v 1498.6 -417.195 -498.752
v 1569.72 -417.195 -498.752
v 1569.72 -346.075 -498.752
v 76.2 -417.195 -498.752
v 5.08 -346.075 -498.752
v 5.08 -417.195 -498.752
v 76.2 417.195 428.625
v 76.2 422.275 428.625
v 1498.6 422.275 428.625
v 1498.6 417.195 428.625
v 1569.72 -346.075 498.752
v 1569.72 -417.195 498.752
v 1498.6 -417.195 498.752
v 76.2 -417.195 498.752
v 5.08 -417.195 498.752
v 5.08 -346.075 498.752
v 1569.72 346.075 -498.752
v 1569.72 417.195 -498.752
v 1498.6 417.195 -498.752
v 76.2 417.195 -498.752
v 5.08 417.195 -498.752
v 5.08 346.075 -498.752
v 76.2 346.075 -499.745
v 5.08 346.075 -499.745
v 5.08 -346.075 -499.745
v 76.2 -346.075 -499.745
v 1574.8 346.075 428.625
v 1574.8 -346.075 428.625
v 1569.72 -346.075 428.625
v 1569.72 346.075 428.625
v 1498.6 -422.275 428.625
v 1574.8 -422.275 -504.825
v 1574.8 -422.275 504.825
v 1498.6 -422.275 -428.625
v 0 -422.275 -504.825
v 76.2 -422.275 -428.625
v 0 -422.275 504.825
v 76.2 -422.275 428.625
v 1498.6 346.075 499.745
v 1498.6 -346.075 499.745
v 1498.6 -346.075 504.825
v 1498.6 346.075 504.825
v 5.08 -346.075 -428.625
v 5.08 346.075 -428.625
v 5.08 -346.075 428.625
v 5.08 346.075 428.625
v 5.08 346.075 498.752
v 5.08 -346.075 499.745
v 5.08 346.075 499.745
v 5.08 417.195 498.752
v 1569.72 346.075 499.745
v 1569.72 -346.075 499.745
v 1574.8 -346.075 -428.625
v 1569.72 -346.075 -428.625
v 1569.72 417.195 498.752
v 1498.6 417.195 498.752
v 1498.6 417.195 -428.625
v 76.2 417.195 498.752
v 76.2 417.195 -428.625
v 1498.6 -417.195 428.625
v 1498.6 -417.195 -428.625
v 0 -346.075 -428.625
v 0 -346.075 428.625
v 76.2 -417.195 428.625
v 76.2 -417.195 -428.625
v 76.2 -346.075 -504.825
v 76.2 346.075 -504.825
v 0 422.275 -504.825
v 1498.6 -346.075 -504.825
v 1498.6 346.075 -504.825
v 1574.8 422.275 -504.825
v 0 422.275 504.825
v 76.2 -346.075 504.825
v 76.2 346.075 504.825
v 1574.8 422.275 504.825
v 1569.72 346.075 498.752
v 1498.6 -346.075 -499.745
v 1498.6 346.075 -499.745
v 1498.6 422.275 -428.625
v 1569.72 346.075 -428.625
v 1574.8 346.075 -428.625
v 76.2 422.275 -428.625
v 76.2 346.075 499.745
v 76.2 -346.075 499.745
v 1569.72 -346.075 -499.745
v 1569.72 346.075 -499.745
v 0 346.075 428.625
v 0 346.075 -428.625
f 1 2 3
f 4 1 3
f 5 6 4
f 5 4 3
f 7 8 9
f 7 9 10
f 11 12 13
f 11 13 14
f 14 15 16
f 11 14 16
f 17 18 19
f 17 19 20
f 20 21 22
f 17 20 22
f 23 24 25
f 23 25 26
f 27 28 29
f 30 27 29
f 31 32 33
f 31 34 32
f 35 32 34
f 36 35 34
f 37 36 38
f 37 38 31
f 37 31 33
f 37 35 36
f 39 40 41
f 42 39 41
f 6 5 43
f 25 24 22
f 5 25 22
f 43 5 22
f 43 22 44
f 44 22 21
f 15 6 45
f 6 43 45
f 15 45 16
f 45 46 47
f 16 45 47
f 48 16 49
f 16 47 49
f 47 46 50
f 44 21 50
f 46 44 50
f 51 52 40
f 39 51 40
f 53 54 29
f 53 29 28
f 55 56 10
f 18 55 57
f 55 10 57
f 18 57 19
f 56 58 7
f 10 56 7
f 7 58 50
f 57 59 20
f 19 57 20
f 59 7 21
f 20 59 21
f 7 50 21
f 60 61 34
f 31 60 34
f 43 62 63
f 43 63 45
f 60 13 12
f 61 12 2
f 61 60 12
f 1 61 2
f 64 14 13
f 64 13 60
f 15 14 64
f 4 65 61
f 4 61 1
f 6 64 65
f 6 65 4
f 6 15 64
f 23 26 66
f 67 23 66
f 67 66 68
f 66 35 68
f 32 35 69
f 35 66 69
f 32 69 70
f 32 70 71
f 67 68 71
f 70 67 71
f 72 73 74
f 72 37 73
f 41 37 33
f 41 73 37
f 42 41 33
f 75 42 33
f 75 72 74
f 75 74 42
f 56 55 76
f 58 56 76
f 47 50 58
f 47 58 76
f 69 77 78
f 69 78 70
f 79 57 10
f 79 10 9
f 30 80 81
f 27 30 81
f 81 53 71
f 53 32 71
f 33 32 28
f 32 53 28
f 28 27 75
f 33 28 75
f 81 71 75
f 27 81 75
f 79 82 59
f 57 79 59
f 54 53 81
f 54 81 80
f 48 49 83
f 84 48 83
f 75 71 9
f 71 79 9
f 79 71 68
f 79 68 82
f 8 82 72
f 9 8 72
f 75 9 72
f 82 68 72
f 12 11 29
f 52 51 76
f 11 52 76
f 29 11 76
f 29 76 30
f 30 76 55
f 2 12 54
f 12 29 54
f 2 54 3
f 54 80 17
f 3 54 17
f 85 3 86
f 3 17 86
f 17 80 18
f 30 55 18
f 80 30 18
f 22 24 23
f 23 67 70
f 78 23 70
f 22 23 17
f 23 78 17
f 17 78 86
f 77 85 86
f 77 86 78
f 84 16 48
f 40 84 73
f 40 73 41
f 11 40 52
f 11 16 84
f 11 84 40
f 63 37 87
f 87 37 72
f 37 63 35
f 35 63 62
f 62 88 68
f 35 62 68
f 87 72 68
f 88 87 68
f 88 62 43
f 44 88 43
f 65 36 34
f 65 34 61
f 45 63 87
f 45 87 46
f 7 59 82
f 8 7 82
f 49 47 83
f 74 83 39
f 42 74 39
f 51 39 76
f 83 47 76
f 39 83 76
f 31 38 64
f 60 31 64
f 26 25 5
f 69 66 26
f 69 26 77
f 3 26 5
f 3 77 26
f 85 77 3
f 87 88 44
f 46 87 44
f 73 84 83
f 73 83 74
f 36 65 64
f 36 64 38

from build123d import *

# Parameters (mm, degrees)
BOSS_EXTRUDE1_DEPTH   = 1574.8
BOSS_EXTRUDE1_2_DEPTH = 1574.8
BOSS_EXTRUDE1_3_DEPTH = 1574.8
BOSS_EXTRUDE1_4_DEPTH = 1574.8
BOSS_EXTRUDE2_START   = -498.751917
BOSS_EXTRUDE2_DEPTH   = 997.503834
BOSS_EXTRUDE3_REACH   = 846.55


with BuildPart() as part:
    # Sketch2 → Boss-Extrude1 (new body)
    with BuildSketch(Plane(origin=(0, 0, 0), x_dir=(0, 0, -1), z_dir=(1, 0, 0))):
        Polygon((-504.825, -346.075), (-504.825, -422.275), (-428.625, -422.275), (-428.625, -417.195), (-498.751917293, -417.195), (-498.751917293, -346.075), align=None)
    extrude(amount=BOSS_EXTRUDE1_DEPTH)



with BuildPart() as body_2:
    # Sketch2 → Boss-Extrude1 2 (new body)
    with BuildSketch(Plane(origin=(0, 0, 0), x_dir=(0, 0, -1), z_dir=(1, 0, 0))):
        Polygon((498.751917293, -417.195), (498.751917293, -346.075), (504.825, -346.075), (504.825, -422.275), (428.625, -422.275), (428.625, -417.195), align=None)
    extrude(amount=BOSS_EXTRUDE1_2_DEPTH)


with BuildPart() as body_3:
    # Sketch2 → Boss-Extrude1 3 (new body)
    with BuildSketch(Plane(origin=(0, 0, 0), x_dir=(0, 0, -1), z_dir=(1, 0, 0))):
        Polygon((428.625, 417.195), (498.751917293, 417.195), (498.751917293, 346.075), (504.825, 346.075), (504.825, 422.275), (428.625, 422.275), align=None)
    extrude(amount=BOSS_EXTRUDE1_3_DEPTH)


with BuildPart() as body_4:
    # Sketch2 → Boss-Extrude1 4 (new body)
    with BuildSketch(Plane(origin=(0, 0, 0), x_dir=(0, 0, -1), z_dir=(1, 0, 0))):
        Polygon((-498.751917293, 417.195), (-498.751917293, 346.075), (-504.825, 346.075), (-504.825, 422.275), (-428.625, 422.275), (-428.625, 417.195), align=None)
    extrude(amount=BOSS_EXTRUDE1_4_DEPTH)


with BuildPart() as part_1:
    add(part.part)

    add(body_2.part)  # Boss-Extrude2 merges body 2

    add(body_3.part)  # Boss-Extrude2 merges body 3

    add(body_4.part)  # Boss-Extrude2 merges body 4
    # Sketch3 → Boss-Extrude2 (add)
    with BuildSketch(Plane.XY.offset(BOSS_EXTRUDE2_START)):
        Polygon((0, -422.275), (0, -346.075), (5.08, -346.075), (5.08, -417.195), (76.2, -417.195), (76.2, -422.275), align=None)
        Polygon((76.2, 422.275), (0, 422.275), (0, 346.075), (5.08, 346.075), (5.08, 417.195), (76.2, 417.195), align=None)
        Polygon((1574.8, 422.275), (1574.8, 346.075), (1569.72, 346.075), (1569.72, 417.195), (1498.6, 417.195), (1498.6, 422.275), align=None)
        Polygon((1498.6, -422.275), (1574.8, -422.275), (1574.8, -346.075), (1569.72, -346.075), (1569.72, -417.195), (1498.6, -417.195), align=None)
    extrude(amount=BOSS_EXTRUDE2_DEPTH)

    # Sketch4 → Boss-Extrude3 (add, up to next)
    with BuildSketch(Plane(origin=(0, 422.275, 0), x_dir=(1, 0, 0), z_dir=(0, 1, 0)), mode=Mode.PRIVATE) as boss_extrude3_sk1:
        Polygon((0, 504.825), (0, 428.625), (5.08, 428.625), (5.08, 499.745), (76.2, 499.745), (76.2, 504.825), align=None)
    boss_extrude3_tool1 = extrude(boss_extrude3_sk1.sketch, amount=-BOSS_EXTRUDE3_REACH, mode=Mode.PRIVATE) - part_1.part
    add(boss_extrude3_tool1.solids().sort_by_distance((1.077631, 422.275, -466.725))[0])
    # Sketch4 → Boss-Extrude3 (add, up to next)
    with BuildSketch(Plane(origin=(0, 422.275, 0), x_dir=(1, 0, 0), z_dir=(0, 1, 0)), mode=Mode.PRIVATE) as boss_extrude3_sk2:
        Polygon((76.2, -504.825), (0, -504.825), (0, -428.625), (5.08, -428.625), (5.08, -499.745), (76.2, -499.745), align=None)
    boss_extrude3_tool2 = extrude(boss_extrude3_sk2.sketch, amount=-BOSS_EXTRUDE3_REACH, mode=Mode.PRIVATE) - part_1.part
    add(boss_extrude3_tool2.solids().sort_by_distance((38.1, 422.275, 503.747369))[0])
    # Sketch4 → Boss-Extrude3 (add, up to next)
    with BuildSketch(Plane(origin=(0, 422.275, 0), x_dir=(1, 0, 0), z_dir=(0, 1, 0)), mode=Mode.PRIVATE) as boss_extrude3_sk3:
        Polygon((1574.8, -504.825), (1574.8, -428.625), (1569.72, -428.625), (1569.72, -499.745), (1498.6, -499.745), (1498.6, -504.825), align=None)
    boss_extrude3_tool3 = extrude(boss_extrude3_sk3.sketch, amount=-BOSS_EXTRUDE3_REACH, mode=Mode.PRIVATE) - part_1.part
    add(boss_extrude3_tool3.solids().sort_by_distance((1573.722369, 422.275, 466.725))[0])
    # Sketch4 → Boss-Extrude3 (add, up to next)
    with BuildSketch(Plane(origin=(0, 422.275, 0), x_dir=(1, 0, 0), z_dir=(0, 1, 0)), mode=Mode.PRIVATE) as boss_extrude3_sk4:
        Polygon((1498.6, 504.825), (1574.8, 504.825), (1574.8, 428.625), (1569.72, 428.625), (1569.72, 499.745), (1498.6, 499.745), align=None)
    boss_extrude3_tool4 = extrude(boss_extrude3_sk4.sketch, amount=-BOSS_EXTRUDE3_REACH, mode=Mode.PRIVATE) - part_1.part
    add(boss_extrude3_tool4.solids().sort_by_distance((1536.7, 422.275, -503.747369))[0])


solid = part_1.part
